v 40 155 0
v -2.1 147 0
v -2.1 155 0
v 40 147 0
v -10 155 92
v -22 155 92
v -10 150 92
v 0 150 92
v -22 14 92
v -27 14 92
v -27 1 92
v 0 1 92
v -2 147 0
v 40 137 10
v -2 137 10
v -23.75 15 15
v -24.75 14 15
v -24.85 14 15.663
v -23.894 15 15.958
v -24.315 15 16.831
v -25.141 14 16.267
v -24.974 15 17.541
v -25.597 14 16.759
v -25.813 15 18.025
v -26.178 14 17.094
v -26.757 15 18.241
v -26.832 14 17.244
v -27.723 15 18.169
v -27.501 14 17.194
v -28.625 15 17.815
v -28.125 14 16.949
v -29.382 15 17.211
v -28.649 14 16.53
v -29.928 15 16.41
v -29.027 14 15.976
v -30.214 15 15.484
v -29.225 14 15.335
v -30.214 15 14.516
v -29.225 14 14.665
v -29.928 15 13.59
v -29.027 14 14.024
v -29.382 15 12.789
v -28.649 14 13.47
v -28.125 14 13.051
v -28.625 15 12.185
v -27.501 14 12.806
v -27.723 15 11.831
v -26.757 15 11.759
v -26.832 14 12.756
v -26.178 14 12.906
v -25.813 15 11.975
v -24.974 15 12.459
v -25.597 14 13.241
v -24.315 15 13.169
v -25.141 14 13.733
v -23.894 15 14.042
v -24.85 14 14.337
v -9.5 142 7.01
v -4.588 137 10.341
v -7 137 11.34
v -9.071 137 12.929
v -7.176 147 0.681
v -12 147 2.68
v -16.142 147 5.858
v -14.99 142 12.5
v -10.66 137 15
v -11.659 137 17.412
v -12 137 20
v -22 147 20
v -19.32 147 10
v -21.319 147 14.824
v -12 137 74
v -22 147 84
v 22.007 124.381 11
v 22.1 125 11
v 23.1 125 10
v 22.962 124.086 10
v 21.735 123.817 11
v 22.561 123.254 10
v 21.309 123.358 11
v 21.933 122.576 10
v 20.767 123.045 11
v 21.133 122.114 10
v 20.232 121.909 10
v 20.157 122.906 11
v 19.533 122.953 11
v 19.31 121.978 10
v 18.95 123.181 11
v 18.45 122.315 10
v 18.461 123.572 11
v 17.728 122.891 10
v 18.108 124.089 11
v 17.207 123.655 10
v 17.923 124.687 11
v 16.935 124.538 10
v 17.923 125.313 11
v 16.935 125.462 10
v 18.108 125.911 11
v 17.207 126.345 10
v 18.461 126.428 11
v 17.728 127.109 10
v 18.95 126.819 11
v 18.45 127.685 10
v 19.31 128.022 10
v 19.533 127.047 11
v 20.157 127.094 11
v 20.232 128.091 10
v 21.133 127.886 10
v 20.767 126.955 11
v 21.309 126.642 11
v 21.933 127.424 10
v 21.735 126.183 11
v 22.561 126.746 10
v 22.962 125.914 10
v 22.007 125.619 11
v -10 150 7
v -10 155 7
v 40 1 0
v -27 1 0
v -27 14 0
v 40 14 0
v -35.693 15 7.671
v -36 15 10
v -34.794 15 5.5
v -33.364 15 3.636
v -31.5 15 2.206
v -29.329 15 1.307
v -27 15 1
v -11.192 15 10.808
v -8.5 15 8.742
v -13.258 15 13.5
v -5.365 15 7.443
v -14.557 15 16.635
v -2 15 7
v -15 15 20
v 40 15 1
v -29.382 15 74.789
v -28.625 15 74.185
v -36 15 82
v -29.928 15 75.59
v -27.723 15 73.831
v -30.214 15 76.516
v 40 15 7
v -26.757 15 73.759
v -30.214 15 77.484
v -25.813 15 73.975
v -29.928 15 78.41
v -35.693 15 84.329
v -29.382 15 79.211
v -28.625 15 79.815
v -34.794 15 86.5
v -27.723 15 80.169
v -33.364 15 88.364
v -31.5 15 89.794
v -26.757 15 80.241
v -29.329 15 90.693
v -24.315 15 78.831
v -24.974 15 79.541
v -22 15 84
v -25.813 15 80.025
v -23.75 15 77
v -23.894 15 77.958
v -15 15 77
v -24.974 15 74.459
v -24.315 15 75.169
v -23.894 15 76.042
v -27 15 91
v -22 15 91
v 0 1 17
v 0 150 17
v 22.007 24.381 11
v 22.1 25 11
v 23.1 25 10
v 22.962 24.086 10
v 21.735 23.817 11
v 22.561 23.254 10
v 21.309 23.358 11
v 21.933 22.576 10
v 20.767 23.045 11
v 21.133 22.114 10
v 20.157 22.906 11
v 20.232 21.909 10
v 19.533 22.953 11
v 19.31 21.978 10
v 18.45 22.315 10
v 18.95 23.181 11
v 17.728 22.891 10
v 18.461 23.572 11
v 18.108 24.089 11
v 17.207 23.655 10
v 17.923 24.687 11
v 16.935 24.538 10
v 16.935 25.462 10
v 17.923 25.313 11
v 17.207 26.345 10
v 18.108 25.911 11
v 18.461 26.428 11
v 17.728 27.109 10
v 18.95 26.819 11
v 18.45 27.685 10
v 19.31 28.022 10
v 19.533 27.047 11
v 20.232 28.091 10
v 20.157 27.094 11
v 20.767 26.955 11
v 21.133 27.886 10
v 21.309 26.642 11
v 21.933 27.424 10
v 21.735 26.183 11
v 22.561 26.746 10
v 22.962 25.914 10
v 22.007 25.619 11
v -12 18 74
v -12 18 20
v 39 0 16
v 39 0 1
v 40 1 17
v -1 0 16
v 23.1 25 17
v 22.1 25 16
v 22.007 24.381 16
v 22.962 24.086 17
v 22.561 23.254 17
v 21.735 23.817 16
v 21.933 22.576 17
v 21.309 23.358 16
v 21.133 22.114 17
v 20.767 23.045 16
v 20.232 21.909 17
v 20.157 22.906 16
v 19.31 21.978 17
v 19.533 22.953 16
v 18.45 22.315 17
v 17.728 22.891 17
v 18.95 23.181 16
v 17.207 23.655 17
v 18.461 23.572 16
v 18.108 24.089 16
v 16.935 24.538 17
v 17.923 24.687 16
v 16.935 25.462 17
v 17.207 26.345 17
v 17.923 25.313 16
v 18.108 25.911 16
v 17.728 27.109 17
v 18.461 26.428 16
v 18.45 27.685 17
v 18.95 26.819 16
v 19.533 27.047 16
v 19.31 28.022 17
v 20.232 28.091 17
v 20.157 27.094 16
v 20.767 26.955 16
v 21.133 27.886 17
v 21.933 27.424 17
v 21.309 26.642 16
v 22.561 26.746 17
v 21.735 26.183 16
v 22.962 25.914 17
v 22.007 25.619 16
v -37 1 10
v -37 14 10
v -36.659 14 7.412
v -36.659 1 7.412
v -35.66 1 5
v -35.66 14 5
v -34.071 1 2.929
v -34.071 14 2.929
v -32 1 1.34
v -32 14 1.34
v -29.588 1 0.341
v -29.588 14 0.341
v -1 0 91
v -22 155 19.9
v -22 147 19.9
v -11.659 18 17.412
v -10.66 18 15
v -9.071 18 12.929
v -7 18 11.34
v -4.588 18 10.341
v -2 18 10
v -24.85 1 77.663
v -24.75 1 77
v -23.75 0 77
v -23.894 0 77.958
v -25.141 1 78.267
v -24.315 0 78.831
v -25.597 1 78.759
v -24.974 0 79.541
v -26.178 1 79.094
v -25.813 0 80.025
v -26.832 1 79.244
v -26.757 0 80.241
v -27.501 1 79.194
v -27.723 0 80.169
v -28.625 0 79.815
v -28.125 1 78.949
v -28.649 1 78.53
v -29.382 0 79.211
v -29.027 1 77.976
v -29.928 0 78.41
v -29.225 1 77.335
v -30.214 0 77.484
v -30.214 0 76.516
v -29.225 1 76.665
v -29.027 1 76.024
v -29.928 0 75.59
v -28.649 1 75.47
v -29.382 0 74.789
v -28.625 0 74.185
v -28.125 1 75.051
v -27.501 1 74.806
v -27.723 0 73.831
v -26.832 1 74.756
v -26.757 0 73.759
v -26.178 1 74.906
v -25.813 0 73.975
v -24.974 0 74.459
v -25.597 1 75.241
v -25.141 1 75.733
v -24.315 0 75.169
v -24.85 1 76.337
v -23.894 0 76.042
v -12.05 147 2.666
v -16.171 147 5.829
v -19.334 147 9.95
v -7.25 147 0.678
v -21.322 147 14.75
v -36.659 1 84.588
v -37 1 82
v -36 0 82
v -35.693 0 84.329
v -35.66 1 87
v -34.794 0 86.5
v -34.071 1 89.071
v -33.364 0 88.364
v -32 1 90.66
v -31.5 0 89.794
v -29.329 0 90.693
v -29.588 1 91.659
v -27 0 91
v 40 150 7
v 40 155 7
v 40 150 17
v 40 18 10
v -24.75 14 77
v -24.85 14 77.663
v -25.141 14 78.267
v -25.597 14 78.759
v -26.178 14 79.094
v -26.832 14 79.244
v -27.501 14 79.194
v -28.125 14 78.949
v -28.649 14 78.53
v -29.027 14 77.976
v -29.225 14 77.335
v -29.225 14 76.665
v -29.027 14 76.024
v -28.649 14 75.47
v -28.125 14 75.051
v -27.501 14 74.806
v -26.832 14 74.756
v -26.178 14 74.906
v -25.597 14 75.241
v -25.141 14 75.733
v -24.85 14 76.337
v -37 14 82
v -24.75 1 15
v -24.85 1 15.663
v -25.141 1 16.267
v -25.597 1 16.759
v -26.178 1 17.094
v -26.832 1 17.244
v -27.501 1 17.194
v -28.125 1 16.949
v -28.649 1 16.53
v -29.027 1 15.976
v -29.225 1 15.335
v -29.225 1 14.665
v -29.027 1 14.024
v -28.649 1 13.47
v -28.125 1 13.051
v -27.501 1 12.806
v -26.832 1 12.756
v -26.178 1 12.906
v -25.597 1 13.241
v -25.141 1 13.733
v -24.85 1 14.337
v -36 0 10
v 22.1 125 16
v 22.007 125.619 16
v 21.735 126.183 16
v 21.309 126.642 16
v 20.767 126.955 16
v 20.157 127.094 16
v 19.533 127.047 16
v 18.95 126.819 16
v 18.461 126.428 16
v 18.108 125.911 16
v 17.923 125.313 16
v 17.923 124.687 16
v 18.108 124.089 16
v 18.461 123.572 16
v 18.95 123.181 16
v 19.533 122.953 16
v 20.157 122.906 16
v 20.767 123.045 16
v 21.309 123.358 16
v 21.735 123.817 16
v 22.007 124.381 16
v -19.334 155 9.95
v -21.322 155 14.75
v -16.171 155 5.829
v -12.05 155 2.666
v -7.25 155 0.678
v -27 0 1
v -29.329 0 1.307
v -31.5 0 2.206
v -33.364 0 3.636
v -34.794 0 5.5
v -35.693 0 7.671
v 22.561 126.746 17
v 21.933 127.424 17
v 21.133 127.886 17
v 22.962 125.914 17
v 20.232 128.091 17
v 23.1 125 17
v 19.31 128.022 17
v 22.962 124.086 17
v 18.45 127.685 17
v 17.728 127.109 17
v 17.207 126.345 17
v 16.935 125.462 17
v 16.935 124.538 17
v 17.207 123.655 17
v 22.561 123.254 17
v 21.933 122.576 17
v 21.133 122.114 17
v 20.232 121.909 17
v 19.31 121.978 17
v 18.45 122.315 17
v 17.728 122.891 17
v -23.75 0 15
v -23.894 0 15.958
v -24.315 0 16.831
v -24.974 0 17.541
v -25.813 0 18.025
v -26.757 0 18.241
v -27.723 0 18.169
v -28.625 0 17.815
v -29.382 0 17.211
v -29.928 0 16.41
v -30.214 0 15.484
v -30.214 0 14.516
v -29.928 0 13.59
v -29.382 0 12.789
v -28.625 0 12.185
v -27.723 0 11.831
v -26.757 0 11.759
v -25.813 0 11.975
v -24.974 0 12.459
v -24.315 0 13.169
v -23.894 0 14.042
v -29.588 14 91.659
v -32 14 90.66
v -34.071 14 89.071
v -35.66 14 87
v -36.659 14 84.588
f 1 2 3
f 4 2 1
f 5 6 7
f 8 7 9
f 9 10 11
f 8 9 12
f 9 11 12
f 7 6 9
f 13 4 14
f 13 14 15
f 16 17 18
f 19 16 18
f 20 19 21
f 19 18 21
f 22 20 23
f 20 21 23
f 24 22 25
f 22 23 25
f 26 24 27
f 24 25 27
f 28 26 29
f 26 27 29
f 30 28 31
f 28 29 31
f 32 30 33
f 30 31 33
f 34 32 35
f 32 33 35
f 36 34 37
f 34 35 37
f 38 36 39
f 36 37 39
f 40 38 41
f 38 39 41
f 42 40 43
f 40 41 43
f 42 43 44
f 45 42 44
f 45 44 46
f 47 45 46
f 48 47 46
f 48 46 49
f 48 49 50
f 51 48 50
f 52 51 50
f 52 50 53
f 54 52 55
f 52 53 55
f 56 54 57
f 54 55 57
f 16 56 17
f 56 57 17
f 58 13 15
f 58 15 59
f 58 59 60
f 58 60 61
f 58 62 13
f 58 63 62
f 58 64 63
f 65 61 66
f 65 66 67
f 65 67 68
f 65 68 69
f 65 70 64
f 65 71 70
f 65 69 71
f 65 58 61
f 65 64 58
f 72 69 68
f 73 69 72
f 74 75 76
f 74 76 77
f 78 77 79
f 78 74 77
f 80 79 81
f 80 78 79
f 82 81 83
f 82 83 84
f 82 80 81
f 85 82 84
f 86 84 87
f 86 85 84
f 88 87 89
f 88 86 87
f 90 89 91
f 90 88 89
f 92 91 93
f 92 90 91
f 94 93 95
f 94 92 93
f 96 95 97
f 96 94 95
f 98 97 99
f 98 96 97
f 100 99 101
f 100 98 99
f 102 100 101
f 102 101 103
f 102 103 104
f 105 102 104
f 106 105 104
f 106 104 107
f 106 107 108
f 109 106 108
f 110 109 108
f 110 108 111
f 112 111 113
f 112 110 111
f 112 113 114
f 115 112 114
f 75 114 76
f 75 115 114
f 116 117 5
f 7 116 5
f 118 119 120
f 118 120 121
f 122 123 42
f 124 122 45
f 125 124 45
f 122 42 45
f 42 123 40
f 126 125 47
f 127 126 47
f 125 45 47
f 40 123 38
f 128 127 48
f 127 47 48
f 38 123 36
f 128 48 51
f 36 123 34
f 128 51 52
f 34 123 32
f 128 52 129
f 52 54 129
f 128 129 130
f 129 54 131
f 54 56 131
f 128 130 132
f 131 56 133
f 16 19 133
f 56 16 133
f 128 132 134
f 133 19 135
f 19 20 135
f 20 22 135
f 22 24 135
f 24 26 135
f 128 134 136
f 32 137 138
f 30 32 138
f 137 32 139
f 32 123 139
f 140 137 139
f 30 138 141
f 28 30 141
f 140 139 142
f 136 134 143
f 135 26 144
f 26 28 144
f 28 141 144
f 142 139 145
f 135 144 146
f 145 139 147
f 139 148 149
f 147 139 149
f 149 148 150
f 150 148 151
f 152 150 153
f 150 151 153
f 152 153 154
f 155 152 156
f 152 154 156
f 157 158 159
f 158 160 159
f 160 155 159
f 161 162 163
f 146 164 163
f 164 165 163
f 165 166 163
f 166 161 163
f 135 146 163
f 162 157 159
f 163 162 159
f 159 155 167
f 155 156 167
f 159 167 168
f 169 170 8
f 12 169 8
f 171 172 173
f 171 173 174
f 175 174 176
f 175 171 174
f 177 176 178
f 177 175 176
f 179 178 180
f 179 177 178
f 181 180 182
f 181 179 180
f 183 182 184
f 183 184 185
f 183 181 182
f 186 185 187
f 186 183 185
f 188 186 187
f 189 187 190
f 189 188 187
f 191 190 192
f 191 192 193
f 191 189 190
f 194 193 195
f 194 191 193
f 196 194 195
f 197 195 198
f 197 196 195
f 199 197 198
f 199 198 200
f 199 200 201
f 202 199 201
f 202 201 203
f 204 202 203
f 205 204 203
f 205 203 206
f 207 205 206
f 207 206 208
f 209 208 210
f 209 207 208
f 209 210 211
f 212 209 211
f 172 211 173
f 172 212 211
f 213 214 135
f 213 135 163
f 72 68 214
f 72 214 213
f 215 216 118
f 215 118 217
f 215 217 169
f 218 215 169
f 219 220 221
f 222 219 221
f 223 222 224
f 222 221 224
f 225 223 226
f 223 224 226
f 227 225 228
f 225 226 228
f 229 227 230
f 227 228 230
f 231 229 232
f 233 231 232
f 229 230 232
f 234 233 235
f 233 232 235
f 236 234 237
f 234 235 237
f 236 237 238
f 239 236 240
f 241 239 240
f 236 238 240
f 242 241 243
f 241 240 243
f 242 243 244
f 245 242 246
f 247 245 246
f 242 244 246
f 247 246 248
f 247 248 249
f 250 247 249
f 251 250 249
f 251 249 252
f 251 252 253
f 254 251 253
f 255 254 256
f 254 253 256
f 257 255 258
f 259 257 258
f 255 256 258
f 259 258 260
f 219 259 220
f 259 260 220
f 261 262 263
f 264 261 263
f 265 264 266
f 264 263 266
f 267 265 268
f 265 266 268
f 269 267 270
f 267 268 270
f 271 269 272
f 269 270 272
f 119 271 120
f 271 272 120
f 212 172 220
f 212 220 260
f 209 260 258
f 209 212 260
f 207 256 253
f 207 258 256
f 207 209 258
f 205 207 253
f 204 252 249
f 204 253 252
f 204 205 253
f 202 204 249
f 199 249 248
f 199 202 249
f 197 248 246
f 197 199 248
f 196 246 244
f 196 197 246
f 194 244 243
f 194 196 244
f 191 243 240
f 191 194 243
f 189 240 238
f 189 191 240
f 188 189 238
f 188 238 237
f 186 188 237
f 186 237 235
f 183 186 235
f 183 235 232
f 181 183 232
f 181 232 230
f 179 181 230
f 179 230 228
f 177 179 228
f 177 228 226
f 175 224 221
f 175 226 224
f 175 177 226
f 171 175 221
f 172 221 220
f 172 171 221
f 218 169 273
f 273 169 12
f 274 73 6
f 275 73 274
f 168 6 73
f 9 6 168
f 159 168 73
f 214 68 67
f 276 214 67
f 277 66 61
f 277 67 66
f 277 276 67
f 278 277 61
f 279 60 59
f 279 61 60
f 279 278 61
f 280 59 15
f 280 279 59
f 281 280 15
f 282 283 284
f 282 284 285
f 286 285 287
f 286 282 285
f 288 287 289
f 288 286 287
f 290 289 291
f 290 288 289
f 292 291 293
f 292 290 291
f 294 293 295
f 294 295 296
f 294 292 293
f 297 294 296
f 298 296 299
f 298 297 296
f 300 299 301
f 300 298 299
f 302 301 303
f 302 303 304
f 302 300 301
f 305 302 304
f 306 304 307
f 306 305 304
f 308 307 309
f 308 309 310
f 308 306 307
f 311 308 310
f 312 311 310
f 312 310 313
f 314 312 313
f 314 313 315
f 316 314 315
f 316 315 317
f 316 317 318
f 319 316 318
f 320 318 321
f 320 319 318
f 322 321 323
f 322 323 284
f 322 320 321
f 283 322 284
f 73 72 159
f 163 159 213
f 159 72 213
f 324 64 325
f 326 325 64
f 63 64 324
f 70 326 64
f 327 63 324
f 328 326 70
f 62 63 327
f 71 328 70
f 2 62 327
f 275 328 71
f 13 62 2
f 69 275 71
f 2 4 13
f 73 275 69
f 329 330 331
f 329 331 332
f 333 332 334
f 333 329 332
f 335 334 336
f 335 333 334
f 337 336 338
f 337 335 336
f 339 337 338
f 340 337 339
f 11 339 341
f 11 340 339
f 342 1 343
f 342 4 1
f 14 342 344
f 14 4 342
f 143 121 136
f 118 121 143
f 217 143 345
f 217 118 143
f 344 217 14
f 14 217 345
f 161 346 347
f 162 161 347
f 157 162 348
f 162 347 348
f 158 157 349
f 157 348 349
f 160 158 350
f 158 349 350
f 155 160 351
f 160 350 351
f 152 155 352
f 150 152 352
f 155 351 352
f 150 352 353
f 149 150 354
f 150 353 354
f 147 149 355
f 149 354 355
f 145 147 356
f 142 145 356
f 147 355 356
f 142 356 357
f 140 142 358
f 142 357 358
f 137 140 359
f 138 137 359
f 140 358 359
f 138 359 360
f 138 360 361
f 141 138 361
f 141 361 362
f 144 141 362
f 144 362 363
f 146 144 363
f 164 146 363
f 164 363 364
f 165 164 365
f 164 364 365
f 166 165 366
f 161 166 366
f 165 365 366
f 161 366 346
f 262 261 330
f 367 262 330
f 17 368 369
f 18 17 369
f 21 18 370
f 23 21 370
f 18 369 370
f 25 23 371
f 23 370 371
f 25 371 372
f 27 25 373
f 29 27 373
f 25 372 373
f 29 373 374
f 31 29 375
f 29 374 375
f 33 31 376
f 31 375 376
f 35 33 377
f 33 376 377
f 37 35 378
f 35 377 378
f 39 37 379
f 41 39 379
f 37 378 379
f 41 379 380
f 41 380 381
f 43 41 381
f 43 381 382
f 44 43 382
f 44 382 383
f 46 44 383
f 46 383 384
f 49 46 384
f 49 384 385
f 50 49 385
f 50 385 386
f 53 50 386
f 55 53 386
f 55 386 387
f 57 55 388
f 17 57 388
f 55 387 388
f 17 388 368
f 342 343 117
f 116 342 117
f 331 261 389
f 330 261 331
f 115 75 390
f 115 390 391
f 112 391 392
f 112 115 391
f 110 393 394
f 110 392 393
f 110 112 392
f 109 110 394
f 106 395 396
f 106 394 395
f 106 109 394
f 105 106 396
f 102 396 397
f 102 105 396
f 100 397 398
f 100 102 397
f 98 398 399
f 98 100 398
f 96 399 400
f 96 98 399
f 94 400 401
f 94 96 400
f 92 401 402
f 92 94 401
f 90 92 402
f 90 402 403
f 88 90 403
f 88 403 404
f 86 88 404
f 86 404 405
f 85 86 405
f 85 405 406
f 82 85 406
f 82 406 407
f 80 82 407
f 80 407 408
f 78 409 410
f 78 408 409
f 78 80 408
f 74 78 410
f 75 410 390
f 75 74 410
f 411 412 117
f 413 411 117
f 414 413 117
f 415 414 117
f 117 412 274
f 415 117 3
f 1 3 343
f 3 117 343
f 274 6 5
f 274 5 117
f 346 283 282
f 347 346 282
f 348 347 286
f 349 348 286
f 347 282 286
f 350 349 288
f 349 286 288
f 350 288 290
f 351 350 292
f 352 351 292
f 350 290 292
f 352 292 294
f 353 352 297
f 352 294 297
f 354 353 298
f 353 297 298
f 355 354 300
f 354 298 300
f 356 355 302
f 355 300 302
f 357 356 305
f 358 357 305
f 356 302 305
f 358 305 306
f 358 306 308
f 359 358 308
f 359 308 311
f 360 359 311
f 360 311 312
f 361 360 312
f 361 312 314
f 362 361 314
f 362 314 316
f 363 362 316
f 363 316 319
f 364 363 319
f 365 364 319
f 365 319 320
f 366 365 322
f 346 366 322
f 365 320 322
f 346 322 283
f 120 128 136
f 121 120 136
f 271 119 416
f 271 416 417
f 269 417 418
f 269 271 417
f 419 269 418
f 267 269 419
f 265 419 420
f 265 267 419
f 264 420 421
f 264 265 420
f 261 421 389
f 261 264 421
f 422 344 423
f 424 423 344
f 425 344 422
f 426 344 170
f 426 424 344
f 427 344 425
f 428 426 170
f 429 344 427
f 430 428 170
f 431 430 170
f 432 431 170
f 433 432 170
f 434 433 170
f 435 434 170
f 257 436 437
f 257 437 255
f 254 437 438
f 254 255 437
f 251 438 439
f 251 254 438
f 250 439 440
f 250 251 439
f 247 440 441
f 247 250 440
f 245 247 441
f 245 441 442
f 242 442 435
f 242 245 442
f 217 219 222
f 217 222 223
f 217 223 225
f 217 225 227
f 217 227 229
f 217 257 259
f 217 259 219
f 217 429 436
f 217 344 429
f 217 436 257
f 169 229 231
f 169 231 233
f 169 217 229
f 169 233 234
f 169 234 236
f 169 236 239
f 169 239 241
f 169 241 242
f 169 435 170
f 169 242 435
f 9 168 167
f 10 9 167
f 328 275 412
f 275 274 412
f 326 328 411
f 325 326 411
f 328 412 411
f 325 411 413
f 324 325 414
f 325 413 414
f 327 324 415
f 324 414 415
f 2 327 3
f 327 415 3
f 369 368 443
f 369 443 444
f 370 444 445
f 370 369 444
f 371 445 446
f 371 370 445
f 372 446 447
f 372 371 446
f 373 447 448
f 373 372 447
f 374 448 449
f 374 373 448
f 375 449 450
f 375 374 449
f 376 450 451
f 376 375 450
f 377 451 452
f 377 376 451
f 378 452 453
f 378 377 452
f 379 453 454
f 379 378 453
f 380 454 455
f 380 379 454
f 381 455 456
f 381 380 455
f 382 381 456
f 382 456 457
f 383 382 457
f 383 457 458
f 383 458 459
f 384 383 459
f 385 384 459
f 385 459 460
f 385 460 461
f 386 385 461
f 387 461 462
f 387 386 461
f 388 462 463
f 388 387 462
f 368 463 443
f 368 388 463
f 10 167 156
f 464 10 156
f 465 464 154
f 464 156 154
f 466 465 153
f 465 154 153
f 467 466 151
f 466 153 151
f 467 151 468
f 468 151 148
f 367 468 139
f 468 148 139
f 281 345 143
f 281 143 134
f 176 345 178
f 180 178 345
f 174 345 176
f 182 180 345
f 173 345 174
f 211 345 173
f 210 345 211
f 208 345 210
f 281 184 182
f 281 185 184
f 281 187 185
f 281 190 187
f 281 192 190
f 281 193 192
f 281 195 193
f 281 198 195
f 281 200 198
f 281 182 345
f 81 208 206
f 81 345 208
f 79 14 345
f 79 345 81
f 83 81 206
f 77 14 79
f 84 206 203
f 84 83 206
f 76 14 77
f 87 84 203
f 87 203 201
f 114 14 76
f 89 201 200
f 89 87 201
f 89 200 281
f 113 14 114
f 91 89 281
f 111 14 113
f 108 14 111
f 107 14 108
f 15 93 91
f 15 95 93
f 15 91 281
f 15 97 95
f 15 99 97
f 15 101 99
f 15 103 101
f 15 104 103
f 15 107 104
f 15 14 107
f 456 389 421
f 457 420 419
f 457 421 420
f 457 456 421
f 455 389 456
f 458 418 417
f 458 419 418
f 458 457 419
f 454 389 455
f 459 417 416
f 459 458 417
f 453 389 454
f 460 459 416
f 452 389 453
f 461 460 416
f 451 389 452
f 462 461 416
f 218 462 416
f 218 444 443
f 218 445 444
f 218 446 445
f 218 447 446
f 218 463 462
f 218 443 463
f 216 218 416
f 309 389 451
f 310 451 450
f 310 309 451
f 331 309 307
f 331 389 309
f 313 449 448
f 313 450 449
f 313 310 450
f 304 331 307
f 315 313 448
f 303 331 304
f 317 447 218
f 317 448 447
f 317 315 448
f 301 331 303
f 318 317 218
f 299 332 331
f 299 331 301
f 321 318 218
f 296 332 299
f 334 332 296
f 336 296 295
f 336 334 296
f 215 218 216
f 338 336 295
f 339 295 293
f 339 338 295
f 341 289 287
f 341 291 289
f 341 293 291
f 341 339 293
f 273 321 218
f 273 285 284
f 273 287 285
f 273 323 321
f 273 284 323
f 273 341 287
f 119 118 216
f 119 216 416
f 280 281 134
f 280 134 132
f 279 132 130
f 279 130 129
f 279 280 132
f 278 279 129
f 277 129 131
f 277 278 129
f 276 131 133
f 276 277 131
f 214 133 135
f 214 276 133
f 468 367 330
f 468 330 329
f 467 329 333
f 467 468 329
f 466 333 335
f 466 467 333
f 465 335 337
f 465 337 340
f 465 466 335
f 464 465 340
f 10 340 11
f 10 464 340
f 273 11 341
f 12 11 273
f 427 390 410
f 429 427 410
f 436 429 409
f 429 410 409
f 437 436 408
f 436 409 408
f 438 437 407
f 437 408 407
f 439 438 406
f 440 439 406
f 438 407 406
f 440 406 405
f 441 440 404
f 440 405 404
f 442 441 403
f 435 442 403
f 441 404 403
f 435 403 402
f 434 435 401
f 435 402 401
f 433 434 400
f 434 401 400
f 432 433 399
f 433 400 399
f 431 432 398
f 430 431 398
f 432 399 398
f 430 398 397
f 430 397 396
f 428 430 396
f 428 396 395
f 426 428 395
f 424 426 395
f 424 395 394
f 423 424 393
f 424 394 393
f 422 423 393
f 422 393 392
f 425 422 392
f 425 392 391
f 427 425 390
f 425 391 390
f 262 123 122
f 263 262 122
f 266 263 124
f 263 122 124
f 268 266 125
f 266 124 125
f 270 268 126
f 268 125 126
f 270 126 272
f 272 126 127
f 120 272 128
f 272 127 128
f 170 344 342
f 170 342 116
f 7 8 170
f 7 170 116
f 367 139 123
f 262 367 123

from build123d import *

# Parameters (mm, degrees)
PAD_DEPTH       = 155
SKETCH001_W     = 15
SKETCH001_H     = 92
SKETCH001_R     = 2.25
PAD001_DEPTH    = 15
POCKET_DEPTH    = 132
FILLET_R        = 10
CHAMFER_SIZE    = 9.99999
FILLET001_R     = 19.9
SKETCH004_W     = 50
SKETCH004_H     = 85
POCKET001_DEPTH = 5
CHAMFER001_SIZE = 3
SKETCH005_R     = 2.1
POCKET002_DEPTH = 92.001
CHAMFER002_SIZE = 1
CHAMFER003_SIZE = 1
CHAMFER004_SIZE = 1


with BuildPart() as part:
    # Sketch → Pad (new body)
    with BuildSketch(Plane.XZ):
        Polygon((40, 0), (40, 17), (0, 17), (0, 92), (-22, 92), (-22, 0), align=None)
    extrude(amount=-PAD_DEPTH)

    # Sketch001 → Pad001 (join)
    with BuildSketch(Plane.XZ):
        with Locations((-29.5, 46)):
            Rectangle(SKETCH001_W, SKETCH001_H)
        with Locations((-27, 77)):
            Circle(SKETCH001_R, mode=Mode.SUBTRACT)
        with Locations((-27, 15)):
            Circle(SKETCH001_R, mode=Mode.SUBTRACT)
    extrude(amount=-PAD001_DEPTH)

    # Sketch002 (on Face5 of Pad001) → Pocket (cut)
    with BuildSketch(Plane(origin=(0, 147, 0), x_dir=(-1, 0, 0), z_dir=(0, 1, 0))):
        Polygon((-40, 0), (-40, 10), (12, 10), (12, 84), (22, 84), (22, 0), align=None)
    extrude(amount=-POCKET_DEPTH, mode=Mode.SUBTRACT)

    # Fillet
    fillet_edges = [part.edges().sort_by_distance(p)[0] for p in [
        (-37, 7.5, 0),
        (-37, 7.5, 92),
        (-12, 81, 10),
    ]]
    fillet(fillet_edges, radius=FILLET_R)

    # Chamfer
    chamfer_edges = [part.edges().sort_by_distance(p)[0] for p in [
        (-12, 81, 84),
        (-12, 147, 52),
    ]]
    chamfer(chamfer_edges, length=CHAMFER_SIZE)

    # Fillet001
    fillet001_edges = [part.edges().sort_by_distance(p)[0] for p in [
        (-22, 151, 0),
    ]]
    fillet(fillet001_edges, radius=FILLET001_R)

    # Sketch004 (on Face5 of Fillet001) → Pocket001 (cut)
    with BuildSketch(Plane(origin=(0, 155, 0), x_dir=(-1, 0, 0), z_dir=(0, 1, 0))):
        with Locations((-15, 49.5)):
            Rectangle(SKETCH004_W, SKETCH004_H)
    extrude(amount=-POCKET001_DEPTH, mode=Mode.SUBTRACT)

    # Chamfer001
    chamfer001_edges = [part.edges().sort_by_distance(p)[0] for p in [
        (19, 15, 10),
    ]]
    chamfer(chamfer001_edges, length=CHAMFER001_SIZE)

    # Sketch005 → Pocket002 (cut, through all)
    with BuildSketch(Plane.XY):
        with Locations((20, 25)):
            Circle(SKETCH005_R)
        with Locations((20, 125)):
            Circle(SKETCH005_R)
    extrude(amount=POCKET002_DEPTH, mode=Mode.SUBTRACT)

    # Chamfer002
    chamfer002_edges = [part.edges().sort_by_distance(p)[0] for p in [
        (17.9, 25, 17),
        (17.9, 125, 17),
        (17.9, 125, 10),
        (17.9, 25, 10),
    ]]
    chamfer(chamfer002_edges, length=CHAMFER002_SIZE)

    # Chamfer003
    chamfer003_edges = [part.edges().sort_by_distance(p)[0] for p in [
        (-13.5, 0, 92),
        (-34.071068, 0, 89.071068),
        (0, 0, 54.5),
        (-37, 0, 46),
        (20, 0, 17),
        (-34.071068, 0, 2.928932),
        (40, 0, 8.5),
        (6.5, 0, 0),
        (-29.25, 0, 15),
        (-29.25, 0, 77),
    ]]
    chamfer(chamfer003_edges, length=CHAMFER003_SIZE)

    # Chamfer004
    chamfer004_edges = [part.edges().sort_by_distance(p)[0] for p in [
        (6.5, 15, 0),
        (-29.25, 15, 77),
        (-29.25, 15, 15),
    ]]
    chamfer(chamfer004_edges, length=CHAMFER004_SIZE)


solid = part.part
